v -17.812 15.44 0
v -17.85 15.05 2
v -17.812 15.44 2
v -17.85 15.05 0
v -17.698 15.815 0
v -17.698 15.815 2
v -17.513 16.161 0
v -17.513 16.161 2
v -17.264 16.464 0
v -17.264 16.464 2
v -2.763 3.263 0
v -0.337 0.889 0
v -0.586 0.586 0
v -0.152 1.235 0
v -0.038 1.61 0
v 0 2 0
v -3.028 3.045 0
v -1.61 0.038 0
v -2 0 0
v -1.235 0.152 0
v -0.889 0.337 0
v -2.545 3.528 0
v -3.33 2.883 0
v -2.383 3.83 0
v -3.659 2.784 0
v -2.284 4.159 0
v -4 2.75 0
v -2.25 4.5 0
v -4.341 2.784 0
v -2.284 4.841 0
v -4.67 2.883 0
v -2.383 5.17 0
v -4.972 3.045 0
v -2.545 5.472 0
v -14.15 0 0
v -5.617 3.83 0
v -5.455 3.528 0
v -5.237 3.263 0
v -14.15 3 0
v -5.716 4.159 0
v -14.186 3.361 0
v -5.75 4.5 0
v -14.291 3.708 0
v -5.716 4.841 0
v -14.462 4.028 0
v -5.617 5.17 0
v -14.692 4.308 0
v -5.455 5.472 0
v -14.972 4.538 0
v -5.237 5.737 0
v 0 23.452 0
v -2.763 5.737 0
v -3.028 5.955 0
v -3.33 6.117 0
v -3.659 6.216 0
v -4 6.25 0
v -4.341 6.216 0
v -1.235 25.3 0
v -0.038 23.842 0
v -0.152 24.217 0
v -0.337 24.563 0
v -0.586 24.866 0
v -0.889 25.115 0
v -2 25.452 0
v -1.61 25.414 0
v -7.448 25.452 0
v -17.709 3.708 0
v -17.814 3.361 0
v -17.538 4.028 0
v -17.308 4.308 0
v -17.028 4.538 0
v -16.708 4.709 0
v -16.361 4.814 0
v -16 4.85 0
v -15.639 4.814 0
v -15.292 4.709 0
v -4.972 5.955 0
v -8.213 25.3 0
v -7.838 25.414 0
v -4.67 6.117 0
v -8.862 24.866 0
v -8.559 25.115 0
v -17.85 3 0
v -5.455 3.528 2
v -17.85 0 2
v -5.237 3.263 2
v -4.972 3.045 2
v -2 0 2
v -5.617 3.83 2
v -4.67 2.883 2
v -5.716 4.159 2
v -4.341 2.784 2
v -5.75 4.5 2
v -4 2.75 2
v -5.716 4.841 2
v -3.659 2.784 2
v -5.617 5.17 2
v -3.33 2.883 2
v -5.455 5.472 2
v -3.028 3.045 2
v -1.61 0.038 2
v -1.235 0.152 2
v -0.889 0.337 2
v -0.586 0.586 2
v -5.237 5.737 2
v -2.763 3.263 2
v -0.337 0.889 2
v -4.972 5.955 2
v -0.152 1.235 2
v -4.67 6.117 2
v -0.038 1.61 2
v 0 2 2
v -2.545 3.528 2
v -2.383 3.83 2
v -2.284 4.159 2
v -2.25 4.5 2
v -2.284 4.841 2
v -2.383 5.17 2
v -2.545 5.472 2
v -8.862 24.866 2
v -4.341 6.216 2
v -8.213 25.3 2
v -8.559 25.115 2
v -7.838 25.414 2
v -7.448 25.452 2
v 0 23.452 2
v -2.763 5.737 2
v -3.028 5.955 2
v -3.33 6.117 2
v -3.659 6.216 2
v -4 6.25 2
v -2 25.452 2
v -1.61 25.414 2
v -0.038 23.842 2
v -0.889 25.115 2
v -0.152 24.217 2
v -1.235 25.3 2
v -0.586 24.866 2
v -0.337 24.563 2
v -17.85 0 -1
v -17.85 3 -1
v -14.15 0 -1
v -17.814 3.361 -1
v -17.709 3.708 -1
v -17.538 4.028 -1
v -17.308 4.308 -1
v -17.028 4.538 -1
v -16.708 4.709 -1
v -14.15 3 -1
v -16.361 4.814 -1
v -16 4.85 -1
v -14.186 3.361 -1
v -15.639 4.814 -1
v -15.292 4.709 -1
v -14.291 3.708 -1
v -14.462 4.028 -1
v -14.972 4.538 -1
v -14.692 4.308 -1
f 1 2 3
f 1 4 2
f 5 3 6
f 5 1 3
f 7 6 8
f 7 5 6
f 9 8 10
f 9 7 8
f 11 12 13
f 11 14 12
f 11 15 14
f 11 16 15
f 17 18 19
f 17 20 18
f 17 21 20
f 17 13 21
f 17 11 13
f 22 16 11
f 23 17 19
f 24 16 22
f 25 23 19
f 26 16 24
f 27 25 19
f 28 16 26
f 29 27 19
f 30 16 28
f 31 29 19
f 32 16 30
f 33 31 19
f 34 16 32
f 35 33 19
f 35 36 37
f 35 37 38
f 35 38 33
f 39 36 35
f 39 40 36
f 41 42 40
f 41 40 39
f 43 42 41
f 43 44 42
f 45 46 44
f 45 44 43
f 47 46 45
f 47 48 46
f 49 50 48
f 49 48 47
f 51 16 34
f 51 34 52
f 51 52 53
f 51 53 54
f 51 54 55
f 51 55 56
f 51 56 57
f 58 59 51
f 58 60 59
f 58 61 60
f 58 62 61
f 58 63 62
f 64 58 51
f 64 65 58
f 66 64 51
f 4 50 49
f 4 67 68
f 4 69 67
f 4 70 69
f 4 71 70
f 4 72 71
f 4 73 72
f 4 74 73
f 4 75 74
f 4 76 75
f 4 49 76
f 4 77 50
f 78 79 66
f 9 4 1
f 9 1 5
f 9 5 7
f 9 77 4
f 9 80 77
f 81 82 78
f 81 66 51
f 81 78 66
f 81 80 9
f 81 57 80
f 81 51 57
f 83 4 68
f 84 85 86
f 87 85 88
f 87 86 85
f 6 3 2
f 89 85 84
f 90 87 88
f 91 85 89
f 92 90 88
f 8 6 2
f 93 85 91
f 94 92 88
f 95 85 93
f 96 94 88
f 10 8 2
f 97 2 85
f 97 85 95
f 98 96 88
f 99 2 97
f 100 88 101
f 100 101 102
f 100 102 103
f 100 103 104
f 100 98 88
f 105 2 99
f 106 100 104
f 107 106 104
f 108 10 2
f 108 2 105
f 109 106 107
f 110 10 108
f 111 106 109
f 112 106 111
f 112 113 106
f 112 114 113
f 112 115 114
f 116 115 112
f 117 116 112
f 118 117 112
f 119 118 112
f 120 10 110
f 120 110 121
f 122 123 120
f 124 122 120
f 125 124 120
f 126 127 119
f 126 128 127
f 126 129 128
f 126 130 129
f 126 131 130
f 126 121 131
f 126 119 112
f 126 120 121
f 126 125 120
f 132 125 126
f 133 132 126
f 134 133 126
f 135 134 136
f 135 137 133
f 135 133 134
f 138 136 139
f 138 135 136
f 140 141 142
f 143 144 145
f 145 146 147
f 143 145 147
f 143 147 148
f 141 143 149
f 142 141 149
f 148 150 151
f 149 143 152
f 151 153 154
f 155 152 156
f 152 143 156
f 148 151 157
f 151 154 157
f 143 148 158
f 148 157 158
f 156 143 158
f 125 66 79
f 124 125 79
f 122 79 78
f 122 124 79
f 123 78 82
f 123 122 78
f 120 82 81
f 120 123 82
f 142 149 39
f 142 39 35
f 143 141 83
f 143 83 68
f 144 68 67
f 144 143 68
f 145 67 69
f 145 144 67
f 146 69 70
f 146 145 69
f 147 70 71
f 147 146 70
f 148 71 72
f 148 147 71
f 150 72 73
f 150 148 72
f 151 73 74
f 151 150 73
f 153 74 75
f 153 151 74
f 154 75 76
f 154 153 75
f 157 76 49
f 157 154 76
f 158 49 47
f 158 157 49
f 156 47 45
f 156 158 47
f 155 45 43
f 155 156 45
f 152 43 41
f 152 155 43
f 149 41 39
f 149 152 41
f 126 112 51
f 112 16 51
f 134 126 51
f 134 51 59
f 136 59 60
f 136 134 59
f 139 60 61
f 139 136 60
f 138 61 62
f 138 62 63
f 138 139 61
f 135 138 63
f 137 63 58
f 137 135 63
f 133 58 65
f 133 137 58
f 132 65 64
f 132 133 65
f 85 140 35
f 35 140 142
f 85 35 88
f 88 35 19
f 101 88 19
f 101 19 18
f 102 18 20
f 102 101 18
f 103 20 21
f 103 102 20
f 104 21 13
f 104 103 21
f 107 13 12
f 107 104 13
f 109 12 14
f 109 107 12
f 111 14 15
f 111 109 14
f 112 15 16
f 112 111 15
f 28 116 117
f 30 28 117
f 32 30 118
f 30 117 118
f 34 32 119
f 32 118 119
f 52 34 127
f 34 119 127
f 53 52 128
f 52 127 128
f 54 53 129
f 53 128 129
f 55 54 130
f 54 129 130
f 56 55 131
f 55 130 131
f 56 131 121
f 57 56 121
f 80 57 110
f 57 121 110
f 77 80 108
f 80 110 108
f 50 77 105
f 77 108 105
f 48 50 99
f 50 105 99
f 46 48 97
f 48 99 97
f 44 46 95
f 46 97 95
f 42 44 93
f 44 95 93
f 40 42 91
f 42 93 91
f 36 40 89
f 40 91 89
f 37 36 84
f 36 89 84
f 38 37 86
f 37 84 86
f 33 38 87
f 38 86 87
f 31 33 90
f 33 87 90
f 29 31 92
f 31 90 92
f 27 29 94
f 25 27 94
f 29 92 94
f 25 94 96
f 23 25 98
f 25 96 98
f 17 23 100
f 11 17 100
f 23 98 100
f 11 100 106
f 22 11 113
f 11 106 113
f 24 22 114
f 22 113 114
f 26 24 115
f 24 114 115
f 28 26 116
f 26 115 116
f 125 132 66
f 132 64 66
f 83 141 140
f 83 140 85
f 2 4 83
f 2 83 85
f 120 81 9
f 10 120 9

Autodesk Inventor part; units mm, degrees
ref_plane "YZ Plane" through (0, 0, 0) normal (1, 0, 0) x (0, 1, 0)
ref_plane "XZ Plane" through (0, 0, 0) normal (0, 1, 0) x (-1, 0, 0)
ref_plane "XY Plane" through (0, 0, 0) normal (0, 0, 1) x (1, 0, 0)
sketch "Sketch1" plane through (0, 0, 0) normal (0, 0, 1) x (1, 0, 0)
  line L0 (0, 0) -> (0, 25.452)
  line L1 (0, 25.452) -> (-8.276, 25.452)
  line L2 (-8.276, 25.452) -> (-18, 15.728)
  line L3 (-18, 15.728) -> (-18, 0)
  line L4 (-18, 0) -> (0, 0)
  dimension "d0" = 8.276
  dimension "d1" = 18
  dimension "d2" = 135
  dimension "d3" = 25.452
extrude "Extrusion1" add sketch "Sketch1" along normal blind 2
sketch "Sketch2" plane through (0, 0, 2) normal (0, 0, 1) x (1, 0, 0)
  line L0 (0, 25.452) -> (-8.276, 25.452) projected
  line L1 (-8.276, 25.452) -> (-18, 15.728) projected
  line L2 (-18, 15.728) -> (-18, 0) projected
  line L3 (-18, 0) -> (0, 0) projected
  line L4 (0, 0) -> (0, 25.452) projected
  line L5 (-18, 0) -> (0, 0) projected
  line L6 (-14, 0) -> (-14, 3)
  arc A0 (-14, 3) -> (-18, 3) centre (-16, 3) ccw
  dimension "d6" = 4
  dimension "d7" = 3
  dimension "d8" = 2
extrude "Extrusion2" add sketch "Sketch2" against normal blind 3 contours L3 L2 A0 L6
sketch "Sketch7" plane through (0, 0, -1) normal (0, 0, -1) x (-1, 0, 0)
  line L0 (18, 0) -> (18, 3) projected
  arc A0 (18, 3) -> (14, 3) centre (16, 3) ccw projected
  line L1 (14, 3) -> (14, 0) projected
  line L2 (14, 0) -> (18, 0) projected
  arc A1 (17.85, 3) -> (14.15, 3) centre (16, 3) ccw
  line L3 (17.85, 3) -> (17.85, 0.15)
  line L4 (17.85, 0.15) -> (14.15, 0.15)
  line L5 (14.15, 0.15) -> (14.15, 3)
  line L6 (14.15, 0.15) -> (14.15, 0)
  line L7 (17.85, 0.15) -> (17.85, 0)
  point P0 (0, 0)
  dimension "d24" = 0.15
extrude "Extrusion6" cut sketch "Sketch7" against normal up to surface (1 mm away) contours L2 L7 L3 A1 L5 L6 L1 A0 L0
sketch "Sketch4" plane through (0, 0, 2) normal (0, 0, 1) x (1, 0, 0)
  circle A0 centre (-4, 4.5) radius 1.75
  line L0 (-18, 15.728) -> (-18, 0) projected
  line L1 (-18, 0) -> (0, 0) projected
  point P0 (-14.15, 0)
  point P1 (-18, 3)
  point P2 (-14, 0)
  dimension "d14" = 3.5
  dimension "d15" = 14
  dimension "d16" = 4.5
extrude "Extrusion4" cut sketch "Sketch4" against normal up to surface (2 mm away)
sketch "Sketch5" plane through (-18, 0, 0) normal (-1, 0, 0) x (0, 0, 1)
  line L0 (2, 15.728) -> (2, 0) projected
  line L1 (0, 15.728) -> (2, 15.728) projected
  line L2 (2, 0) -> (2, 25.452) projected
  line L3 (0, 15.728) -> (2, 15.728)
  line L4 (2, 15.728) -> (2, 19.0295)
  line L5 (2, 19.0295) -> (0, 19.0295)
  line L6 (0, 19.0295) -> (0, 15.728)
  line L7 (0, 15.728) -> (0, 0) projected
  line L8 (0, 0) -> (2, 0) projected
  point P0 (0, 0)
extrude "Extrusion5" cut sketch "Sketch5" against normal up to surface (0.15 mm away)
fillet "Fillet1" radius 2 4 edges at (-8.276, 25.452, 1) (-17.85, 15.878, 1) (0, 25.452, 1) (0, 0, 1)
sketch "Sketch6" plane through (0, 0, 2) normal (0, 0, 1) x (1, 0, 0)
  circle A0 centre (1.75, 1.9974) radius 1.5
  line L0 (0, 2) -> (0, 23.452) projected
  point P0 (0, 0)
  dimension "d22" = 3
  dimension "d23" = 1.75
properties part number "ScrewStopper"
